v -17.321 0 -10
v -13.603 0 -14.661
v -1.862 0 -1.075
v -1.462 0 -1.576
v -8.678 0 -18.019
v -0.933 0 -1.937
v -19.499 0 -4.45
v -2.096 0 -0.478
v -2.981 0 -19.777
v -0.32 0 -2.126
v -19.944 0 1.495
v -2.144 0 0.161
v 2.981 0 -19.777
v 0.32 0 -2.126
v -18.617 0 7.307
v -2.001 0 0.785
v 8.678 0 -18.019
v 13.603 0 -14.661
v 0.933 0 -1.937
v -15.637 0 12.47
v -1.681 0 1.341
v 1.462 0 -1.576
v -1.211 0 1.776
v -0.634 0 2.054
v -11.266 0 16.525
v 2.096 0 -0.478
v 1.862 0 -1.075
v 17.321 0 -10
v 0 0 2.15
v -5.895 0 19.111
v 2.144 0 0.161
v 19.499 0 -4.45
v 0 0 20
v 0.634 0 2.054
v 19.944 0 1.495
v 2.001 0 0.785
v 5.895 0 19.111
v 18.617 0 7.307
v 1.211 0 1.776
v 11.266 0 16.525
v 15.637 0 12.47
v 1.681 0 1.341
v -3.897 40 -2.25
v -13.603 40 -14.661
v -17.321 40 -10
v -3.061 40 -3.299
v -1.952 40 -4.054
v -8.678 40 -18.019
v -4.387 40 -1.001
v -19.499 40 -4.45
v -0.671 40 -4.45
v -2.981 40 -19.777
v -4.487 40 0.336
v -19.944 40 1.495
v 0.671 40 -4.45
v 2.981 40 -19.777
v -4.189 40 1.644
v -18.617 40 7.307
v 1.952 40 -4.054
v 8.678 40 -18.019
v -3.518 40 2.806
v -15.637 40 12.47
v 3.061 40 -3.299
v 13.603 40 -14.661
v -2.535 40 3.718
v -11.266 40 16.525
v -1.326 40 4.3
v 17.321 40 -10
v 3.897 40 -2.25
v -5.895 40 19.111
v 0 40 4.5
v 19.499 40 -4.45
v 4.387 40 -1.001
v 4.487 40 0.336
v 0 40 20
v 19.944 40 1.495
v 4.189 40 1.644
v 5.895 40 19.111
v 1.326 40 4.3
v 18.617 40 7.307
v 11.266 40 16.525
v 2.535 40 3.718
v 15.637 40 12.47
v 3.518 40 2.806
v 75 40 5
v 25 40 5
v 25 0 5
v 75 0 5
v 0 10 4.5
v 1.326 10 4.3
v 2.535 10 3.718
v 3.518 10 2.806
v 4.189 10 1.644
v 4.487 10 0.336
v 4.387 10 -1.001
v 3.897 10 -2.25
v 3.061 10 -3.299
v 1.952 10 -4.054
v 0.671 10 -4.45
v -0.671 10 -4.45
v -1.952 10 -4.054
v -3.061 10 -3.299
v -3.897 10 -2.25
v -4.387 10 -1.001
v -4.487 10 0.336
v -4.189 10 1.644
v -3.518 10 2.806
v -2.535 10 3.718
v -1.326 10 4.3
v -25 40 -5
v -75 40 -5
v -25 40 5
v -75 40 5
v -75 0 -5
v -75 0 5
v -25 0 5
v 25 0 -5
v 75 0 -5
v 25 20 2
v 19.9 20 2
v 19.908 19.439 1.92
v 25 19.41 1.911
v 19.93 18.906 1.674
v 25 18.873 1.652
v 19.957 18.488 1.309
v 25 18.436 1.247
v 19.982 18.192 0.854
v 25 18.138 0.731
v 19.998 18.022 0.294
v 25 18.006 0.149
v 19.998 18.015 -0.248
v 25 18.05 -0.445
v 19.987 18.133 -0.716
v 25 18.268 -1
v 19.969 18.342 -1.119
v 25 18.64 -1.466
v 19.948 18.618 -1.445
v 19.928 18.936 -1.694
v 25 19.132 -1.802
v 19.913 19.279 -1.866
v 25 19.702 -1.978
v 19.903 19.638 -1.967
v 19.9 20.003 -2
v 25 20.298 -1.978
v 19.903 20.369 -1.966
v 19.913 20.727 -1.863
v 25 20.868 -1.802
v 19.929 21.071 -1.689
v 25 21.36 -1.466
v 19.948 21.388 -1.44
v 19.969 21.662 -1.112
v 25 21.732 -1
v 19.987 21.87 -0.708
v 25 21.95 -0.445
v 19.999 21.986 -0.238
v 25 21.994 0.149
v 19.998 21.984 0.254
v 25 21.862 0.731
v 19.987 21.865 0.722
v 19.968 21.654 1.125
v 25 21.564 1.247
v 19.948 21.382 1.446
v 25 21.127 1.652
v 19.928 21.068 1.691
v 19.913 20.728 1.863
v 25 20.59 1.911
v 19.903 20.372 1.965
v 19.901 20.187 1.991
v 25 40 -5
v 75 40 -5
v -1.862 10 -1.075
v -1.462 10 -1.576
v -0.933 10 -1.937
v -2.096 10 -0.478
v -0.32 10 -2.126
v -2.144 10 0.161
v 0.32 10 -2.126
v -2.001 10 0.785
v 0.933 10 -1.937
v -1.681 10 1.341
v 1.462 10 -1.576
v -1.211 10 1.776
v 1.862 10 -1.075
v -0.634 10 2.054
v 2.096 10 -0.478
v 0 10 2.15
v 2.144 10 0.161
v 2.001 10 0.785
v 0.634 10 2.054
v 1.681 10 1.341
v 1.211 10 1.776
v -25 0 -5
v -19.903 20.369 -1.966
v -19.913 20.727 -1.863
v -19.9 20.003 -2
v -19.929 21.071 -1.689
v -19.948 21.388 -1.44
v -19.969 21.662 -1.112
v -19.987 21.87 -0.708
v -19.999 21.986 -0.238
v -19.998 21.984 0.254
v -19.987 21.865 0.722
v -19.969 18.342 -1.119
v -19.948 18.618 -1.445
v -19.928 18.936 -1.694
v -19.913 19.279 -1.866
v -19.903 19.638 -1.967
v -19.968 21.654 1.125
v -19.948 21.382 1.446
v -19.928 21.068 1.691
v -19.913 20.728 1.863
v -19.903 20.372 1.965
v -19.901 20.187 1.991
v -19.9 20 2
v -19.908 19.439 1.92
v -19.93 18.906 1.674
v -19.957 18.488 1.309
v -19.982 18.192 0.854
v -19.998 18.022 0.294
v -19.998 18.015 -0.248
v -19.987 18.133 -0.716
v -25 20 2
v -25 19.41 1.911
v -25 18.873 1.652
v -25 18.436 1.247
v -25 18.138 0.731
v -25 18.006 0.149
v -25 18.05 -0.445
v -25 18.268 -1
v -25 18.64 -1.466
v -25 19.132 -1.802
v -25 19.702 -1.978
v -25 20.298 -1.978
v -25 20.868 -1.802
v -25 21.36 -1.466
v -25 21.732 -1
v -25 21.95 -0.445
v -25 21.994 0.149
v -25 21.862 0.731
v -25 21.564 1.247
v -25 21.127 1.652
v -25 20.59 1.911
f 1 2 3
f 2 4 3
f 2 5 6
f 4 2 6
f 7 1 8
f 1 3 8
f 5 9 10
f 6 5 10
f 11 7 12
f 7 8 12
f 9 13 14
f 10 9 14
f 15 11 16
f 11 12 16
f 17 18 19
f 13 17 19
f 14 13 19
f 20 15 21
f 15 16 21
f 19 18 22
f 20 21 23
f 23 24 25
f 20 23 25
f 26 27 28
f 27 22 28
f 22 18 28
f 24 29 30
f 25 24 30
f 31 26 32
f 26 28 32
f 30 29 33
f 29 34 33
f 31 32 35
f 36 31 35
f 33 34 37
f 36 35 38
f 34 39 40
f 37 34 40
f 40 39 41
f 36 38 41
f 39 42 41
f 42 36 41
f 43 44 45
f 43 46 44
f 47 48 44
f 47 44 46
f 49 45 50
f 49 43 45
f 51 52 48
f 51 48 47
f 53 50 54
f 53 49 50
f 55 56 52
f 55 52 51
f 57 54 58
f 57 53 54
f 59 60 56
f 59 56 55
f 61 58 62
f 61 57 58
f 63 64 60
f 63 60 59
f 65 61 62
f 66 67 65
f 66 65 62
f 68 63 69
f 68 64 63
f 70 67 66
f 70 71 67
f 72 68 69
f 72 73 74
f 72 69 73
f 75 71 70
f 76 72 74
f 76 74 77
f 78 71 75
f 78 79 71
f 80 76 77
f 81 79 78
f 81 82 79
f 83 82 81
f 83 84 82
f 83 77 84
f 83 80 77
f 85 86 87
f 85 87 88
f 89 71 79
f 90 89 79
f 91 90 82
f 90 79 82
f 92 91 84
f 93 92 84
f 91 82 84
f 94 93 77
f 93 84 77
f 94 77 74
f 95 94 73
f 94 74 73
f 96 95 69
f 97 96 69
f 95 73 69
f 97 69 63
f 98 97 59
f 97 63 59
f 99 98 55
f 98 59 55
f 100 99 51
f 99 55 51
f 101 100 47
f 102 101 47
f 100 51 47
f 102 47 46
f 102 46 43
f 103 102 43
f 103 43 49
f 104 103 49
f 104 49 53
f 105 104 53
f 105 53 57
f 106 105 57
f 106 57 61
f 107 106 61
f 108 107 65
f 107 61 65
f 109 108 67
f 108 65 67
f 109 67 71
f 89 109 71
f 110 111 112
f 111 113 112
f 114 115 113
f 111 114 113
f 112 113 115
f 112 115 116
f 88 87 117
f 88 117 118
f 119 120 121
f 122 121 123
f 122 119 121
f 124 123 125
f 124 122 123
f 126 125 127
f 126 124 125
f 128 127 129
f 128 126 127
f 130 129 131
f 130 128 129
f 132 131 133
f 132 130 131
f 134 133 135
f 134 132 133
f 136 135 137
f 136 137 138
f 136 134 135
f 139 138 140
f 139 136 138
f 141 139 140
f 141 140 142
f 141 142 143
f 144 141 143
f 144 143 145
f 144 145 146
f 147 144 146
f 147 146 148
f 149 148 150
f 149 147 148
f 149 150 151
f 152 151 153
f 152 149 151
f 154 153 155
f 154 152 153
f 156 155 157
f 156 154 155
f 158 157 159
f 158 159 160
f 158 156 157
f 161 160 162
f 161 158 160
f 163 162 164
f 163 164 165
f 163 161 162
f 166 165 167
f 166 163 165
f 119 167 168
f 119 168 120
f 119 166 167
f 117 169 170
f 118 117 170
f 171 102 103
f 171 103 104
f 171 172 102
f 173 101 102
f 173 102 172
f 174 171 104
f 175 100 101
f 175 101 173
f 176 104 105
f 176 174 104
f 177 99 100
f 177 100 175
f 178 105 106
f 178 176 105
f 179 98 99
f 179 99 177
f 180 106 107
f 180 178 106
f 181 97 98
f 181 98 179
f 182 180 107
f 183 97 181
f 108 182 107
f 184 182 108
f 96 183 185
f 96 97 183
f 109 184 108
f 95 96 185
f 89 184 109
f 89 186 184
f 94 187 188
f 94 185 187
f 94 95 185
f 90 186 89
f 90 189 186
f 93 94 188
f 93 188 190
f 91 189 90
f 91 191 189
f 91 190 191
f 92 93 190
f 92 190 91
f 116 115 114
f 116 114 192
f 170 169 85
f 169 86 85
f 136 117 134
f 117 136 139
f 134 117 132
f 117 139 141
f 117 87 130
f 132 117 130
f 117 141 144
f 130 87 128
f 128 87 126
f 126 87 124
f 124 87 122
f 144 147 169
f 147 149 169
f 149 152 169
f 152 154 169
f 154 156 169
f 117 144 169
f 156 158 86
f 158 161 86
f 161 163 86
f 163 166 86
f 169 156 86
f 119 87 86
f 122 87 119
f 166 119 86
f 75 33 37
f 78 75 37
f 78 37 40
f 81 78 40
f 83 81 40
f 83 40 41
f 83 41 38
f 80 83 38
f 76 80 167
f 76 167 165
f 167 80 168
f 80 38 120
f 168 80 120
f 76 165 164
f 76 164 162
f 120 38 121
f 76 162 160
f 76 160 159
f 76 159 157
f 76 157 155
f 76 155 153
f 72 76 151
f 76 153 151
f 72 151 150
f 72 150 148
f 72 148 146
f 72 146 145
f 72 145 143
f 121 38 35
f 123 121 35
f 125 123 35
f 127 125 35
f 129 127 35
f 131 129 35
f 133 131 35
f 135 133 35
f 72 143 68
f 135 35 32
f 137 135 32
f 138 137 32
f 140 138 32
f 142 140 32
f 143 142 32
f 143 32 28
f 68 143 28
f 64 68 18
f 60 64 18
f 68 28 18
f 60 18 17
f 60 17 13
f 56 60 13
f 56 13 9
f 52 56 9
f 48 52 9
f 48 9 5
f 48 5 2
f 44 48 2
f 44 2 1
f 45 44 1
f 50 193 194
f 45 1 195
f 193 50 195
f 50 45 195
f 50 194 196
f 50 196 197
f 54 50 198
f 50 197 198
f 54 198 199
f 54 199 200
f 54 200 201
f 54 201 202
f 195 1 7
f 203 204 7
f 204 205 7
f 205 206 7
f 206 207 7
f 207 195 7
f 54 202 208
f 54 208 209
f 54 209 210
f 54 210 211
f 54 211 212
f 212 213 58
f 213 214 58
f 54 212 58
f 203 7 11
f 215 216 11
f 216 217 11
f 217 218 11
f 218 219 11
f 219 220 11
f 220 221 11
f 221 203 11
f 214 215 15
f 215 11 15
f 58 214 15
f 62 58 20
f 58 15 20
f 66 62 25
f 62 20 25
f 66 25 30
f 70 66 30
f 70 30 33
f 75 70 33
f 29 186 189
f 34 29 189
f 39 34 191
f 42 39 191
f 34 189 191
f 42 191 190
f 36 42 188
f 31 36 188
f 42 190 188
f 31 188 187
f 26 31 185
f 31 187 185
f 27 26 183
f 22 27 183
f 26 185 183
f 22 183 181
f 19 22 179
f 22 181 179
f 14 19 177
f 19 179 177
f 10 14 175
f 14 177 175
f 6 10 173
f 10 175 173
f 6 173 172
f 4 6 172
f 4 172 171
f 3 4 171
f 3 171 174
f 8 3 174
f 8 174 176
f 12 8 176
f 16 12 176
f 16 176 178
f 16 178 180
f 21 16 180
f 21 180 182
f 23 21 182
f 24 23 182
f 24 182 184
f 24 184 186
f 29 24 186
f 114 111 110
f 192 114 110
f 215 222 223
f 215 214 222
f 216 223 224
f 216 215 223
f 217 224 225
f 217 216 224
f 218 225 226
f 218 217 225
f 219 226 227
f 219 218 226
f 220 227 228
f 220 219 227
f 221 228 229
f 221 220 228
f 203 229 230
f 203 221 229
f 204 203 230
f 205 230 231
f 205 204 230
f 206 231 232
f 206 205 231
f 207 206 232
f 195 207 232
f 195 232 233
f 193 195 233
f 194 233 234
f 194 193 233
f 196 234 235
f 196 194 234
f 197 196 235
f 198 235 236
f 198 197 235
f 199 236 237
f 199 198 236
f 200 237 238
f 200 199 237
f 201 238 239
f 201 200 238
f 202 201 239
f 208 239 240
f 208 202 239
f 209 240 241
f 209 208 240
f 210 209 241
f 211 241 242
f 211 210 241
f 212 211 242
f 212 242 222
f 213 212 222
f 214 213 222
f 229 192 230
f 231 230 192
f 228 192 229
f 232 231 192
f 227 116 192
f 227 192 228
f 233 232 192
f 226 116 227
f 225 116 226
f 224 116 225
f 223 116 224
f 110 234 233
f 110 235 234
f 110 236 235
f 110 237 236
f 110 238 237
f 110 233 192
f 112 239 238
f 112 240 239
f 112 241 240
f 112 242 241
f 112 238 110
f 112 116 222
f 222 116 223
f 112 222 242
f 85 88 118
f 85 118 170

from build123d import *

# Parameters (mm, degrees)
SKETCH1_R             = 20
BOSS_EXTRUDE1_DEPTH   = 40
BOSS_EXTRUDE2_DEPTH   = 5
BOSS_EXTRUDE2_2_DEPTH = 5
SKETCH7_R             = 2
BOSS_EXTRUDE3_DEPTH   = 50
SKETCH9_R             = 4.5
CUT_EXTRUDE1_DEPTH    = 30
SKETCH9_3_R           = 2.15
CUT_EXTRUDE2_DEPTH    = 88.321246052


with BuildPart() as part:
    # Sketch1 → Boss-Extrude1 (new body)
    with BuildSketch(Plane(origin=(0, 0, 0), x_dir=(1, 0, 0), z_dir=(0, 1, 0))):
        Circle(SKETCH1_R)
    extrude(amount=BOSS_EXTRUDE1_DEPTH)



with BuildPart() as body_2:
    # Sketch2 → Boss-Extrude2 (new, symmetric)
    with BuildSketch(Plane.XY):
        Polygon((-25, 0), (-25, 20), (-25, 40), (-75, 40), (-75, 0), align=None)
    extrude(amount=BOSS_EXTRUDE2_DEPTH, both=True)


with BuildPart() as body_3:
    # Sketch2 → Boss-Extrude2 2 (new, symmetric)
    with BuildSketch(Plane.XY):
        Polygon((25, 40), (25, 20), (25, 0), (75, 0), (75, 40), align=None)
    extrude(amount=BOSS_EXTRUDE2_2_DEPTH, both=True)


with BuildPart() as part_1:
    add(part.part)

    add(body_2.part)  # Boss-Extrude3 merges body 2

    add(body_3.part)  # Boss-Extrude3 merges body 3
    # Sketch7 → Boss-Extrude3 (add, symmetric)
    with BuildSketch(Plane(origin=(0, 0, 0), x_dir=(0, 0, -1), z_dir=(1, 0, 0))):
        with Locations((0, 20)):
            Circle(SKETCH7_R)
    extrude(amount=BOSS_EXTRUDE3_DEPTH, both=True)

    # Sketch9 → Cut-Extrude1 (cut)
    with BuildSketch(Plane(origin=(0, 40, 0), x_dir=(1, 0, 0), z_dir=(0, 1, 0))):
        Circle(SKETCH9_R)
    extrude(amount=-CUT_EXTRUDE1_DEPTH, mode=Mode.SUBTRACT)

    # Sketch9<3> → Cut-Extrude2 (cut, through all)
    with BuildSketch(Plane(origin=(0, 40, 0), x_dir=(1, 0, 0), z_dir=(0, 1, 0))):
        Circle(SKETCH9_3_R)
    extrude(amount=-CUT_EXTRUDE2_DEPTH, mode=Mode.SUBTRACT)


solid = part_1.part
